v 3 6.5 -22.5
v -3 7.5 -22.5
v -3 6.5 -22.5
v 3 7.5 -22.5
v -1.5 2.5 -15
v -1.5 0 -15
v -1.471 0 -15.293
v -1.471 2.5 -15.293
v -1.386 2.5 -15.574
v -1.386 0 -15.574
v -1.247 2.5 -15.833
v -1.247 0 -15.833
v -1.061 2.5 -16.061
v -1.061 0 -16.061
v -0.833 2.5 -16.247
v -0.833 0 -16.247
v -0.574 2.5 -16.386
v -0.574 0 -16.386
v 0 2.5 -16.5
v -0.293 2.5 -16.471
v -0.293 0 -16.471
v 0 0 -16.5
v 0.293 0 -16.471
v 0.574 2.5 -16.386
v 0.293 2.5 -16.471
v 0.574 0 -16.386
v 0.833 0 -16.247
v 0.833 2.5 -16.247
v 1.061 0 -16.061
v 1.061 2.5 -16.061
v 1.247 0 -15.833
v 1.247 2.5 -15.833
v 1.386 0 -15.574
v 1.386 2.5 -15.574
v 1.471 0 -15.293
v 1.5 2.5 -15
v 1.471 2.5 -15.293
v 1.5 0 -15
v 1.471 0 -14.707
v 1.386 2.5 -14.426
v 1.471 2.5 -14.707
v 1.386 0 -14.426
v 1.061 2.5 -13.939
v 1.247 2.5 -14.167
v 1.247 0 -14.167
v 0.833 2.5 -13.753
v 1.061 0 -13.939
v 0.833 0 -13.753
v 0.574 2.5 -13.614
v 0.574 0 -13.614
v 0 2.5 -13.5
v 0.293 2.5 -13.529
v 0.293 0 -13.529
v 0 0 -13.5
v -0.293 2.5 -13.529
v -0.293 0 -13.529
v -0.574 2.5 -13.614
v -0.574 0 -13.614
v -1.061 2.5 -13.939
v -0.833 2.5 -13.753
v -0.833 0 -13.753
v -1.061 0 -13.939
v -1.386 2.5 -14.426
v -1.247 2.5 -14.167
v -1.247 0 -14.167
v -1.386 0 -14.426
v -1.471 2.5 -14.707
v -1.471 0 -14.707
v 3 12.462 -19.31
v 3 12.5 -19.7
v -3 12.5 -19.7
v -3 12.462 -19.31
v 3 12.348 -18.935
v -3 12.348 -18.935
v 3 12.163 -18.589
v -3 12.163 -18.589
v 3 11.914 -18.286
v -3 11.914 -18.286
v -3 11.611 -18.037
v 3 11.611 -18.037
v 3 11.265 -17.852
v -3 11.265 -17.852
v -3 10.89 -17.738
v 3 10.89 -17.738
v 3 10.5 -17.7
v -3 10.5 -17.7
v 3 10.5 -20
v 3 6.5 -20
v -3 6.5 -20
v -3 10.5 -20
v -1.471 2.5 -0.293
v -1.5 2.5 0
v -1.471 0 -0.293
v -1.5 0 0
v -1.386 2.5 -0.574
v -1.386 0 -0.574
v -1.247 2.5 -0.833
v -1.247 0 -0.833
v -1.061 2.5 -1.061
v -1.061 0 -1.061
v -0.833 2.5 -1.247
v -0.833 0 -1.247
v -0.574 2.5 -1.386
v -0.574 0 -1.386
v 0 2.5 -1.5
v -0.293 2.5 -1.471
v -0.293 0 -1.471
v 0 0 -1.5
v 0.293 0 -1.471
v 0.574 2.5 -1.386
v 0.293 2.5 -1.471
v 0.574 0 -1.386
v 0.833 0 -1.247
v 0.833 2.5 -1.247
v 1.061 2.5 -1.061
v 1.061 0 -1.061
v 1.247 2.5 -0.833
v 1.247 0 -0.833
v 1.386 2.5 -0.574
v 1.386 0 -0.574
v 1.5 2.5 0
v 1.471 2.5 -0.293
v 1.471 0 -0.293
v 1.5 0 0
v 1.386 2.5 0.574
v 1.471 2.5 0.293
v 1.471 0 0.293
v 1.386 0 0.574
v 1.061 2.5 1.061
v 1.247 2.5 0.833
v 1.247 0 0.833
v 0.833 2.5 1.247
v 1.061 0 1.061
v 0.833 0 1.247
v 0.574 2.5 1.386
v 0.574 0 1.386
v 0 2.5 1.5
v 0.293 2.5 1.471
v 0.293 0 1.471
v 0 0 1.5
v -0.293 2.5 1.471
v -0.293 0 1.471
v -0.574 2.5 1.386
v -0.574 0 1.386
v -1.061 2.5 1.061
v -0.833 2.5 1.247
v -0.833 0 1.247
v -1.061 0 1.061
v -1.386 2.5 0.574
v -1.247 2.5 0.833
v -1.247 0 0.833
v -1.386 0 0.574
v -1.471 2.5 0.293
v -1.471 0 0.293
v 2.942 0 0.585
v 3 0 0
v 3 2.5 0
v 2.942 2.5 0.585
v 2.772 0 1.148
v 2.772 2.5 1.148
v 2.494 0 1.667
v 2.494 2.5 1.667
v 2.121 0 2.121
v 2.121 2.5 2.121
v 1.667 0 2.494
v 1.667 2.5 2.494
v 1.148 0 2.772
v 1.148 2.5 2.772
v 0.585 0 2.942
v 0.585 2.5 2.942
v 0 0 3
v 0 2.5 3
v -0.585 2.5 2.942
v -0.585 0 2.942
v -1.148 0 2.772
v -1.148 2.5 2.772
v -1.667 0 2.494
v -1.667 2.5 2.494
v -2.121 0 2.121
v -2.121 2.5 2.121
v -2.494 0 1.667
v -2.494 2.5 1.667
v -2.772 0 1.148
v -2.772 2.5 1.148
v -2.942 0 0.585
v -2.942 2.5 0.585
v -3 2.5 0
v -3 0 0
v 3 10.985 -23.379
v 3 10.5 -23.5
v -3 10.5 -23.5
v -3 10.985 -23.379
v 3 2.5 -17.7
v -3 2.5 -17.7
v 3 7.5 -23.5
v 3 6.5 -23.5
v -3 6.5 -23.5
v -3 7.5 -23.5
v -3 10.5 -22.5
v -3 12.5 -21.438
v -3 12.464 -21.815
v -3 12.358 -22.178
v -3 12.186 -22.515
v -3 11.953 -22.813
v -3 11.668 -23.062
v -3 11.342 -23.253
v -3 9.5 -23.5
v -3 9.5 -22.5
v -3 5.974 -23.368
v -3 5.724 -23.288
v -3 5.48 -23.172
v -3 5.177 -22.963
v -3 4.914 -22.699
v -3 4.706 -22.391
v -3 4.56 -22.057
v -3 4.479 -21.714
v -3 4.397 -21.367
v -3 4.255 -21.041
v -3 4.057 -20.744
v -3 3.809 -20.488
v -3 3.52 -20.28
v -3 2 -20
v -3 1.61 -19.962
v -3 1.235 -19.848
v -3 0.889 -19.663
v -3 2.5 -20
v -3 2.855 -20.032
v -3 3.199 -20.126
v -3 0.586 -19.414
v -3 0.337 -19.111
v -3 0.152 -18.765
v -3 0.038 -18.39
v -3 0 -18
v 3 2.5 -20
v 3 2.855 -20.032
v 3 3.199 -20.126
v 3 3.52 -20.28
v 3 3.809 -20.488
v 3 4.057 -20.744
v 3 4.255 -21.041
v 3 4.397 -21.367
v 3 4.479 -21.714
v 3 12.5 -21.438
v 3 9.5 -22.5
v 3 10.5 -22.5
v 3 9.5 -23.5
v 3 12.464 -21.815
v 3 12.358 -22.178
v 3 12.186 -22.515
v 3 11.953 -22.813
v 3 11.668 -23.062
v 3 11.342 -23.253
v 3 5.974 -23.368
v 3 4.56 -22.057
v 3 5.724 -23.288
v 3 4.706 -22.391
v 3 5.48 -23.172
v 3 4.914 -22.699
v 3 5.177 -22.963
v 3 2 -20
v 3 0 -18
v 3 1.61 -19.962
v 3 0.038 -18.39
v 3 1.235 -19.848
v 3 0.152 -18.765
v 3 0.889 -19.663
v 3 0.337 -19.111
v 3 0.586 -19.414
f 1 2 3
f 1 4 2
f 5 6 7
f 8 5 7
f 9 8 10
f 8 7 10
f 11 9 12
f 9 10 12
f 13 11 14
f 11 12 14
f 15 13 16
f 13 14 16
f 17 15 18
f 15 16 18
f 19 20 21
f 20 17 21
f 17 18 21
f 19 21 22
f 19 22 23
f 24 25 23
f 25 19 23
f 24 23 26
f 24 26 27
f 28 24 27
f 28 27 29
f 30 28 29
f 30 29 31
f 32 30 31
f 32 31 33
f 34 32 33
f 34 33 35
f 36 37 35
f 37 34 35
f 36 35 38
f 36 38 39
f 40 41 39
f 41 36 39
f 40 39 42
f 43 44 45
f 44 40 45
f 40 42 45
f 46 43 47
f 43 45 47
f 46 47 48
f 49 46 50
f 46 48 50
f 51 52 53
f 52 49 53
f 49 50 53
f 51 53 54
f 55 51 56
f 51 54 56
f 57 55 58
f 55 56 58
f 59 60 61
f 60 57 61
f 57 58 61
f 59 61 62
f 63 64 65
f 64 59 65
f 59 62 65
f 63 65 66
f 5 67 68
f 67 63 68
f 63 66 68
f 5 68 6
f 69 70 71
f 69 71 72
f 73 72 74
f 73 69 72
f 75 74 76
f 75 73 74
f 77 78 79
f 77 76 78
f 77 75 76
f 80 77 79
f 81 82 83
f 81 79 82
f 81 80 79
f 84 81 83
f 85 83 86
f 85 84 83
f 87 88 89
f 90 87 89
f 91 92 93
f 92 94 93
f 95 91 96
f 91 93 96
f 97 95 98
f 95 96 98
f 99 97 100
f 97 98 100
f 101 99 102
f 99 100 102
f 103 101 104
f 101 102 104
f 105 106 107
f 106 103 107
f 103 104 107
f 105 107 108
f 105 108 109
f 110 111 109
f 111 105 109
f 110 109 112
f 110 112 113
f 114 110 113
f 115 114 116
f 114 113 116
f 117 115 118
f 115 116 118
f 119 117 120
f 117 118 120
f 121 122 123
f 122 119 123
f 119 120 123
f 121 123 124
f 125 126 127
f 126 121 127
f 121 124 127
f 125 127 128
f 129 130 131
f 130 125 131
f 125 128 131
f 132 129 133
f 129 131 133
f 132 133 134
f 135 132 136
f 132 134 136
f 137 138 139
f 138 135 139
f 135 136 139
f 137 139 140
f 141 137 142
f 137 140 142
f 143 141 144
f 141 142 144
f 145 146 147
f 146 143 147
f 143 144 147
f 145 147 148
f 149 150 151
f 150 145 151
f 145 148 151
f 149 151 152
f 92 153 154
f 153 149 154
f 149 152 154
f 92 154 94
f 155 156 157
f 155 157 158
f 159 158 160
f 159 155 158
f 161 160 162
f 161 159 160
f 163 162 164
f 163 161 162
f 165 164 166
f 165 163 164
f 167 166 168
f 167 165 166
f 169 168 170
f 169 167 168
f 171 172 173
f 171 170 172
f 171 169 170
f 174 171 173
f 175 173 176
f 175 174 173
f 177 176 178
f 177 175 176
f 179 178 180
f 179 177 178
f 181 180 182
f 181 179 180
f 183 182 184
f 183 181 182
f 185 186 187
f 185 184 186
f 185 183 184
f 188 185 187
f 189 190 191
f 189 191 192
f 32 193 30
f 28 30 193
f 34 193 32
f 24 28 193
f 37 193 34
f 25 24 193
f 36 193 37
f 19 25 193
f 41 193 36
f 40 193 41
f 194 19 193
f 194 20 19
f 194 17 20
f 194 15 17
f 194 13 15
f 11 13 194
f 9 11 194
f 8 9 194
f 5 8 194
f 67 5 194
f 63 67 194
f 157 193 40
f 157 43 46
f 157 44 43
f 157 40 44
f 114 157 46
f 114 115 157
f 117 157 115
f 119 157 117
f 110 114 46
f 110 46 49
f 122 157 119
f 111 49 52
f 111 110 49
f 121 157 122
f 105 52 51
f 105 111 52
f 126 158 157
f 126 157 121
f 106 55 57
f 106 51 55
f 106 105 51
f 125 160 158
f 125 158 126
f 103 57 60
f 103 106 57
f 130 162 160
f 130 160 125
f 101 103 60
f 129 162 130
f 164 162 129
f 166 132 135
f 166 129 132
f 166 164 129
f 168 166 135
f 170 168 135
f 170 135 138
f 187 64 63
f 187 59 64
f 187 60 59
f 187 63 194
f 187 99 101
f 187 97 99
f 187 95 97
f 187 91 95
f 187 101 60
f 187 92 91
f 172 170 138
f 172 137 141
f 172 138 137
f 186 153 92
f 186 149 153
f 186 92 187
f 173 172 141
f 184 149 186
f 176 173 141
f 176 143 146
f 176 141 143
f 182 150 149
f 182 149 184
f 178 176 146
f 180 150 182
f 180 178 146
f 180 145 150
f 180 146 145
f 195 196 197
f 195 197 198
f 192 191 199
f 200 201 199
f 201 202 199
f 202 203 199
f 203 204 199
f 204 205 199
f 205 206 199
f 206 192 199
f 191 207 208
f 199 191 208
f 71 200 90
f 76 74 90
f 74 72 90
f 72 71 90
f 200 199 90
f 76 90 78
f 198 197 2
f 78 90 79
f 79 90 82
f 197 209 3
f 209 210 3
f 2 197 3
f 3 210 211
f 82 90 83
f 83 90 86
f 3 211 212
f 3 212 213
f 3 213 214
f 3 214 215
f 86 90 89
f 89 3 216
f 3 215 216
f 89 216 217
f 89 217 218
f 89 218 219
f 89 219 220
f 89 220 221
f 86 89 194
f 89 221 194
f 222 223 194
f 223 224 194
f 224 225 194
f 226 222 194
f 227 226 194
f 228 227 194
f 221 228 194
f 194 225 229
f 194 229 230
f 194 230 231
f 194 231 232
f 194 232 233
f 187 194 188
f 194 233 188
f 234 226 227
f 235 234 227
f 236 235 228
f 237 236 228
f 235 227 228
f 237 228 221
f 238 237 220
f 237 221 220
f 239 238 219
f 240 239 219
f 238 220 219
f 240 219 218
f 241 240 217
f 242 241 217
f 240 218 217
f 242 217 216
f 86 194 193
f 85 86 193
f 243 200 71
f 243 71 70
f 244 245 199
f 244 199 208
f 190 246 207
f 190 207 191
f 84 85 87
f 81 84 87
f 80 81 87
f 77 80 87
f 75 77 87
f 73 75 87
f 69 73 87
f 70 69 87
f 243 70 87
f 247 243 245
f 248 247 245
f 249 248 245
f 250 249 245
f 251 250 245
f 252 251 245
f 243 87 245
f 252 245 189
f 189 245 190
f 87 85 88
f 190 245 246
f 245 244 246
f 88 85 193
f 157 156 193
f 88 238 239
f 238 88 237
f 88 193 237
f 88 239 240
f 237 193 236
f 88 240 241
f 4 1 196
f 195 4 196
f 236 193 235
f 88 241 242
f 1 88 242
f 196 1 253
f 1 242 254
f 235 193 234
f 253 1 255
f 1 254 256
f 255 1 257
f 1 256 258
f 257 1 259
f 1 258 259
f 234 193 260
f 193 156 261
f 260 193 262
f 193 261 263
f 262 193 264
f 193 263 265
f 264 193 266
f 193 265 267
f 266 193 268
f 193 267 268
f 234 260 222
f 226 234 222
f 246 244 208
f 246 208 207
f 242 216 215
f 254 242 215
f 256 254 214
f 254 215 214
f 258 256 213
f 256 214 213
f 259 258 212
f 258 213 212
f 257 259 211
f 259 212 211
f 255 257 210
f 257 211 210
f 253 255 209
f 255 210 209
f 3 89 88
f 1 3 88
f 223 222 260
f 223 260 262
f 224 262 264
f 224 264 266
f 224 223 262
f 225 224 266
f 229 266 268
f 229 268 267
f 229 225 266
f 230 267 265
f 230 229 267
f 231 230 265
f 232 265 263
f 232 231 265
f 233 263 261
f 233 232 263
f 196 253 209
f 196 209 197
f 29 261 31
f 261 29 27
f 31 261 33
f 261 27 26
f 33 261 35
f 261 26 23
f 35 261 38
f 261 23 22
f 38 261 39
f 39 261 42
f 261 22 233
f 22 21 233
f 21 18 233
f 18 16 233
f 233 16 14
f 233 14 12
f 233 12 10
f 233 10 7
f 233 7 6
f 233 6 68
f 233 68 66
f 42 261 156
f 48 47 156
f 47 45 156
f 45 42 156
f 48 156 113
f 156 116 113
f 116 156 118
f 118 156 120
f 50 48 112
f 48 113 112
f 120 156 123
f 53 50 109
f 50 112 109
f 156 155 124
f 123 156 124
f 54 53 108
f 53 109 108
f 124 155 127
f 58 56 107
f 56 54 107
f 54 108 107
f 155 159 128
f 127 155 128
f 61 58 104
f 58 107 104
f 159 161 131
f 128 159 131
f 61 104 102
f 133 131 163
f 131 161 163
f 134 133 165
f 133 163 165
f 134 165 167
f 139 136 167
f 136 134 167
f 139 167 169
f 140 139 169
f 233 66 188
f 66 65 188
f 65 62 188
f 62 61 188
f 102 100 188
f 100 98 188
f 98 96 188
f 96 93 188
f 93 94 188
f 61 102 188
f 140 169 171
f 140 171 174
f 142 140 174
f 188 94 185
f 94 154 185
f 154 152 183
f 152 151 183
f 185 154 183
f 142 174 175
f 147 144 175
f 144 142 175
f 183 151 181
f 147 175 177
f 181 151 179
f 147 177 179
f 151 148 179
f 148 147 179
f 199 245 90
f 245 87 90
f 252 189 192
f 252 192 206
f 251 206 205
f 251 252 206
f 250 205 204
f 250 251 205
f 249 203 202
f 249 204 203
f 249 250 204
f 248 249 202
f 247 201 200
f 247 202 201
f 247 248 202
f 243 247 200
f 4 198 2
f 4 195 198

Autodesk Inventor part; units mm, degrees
ref_plane "YZ Plane" through (0, 0, 0) normal (1, 0, 0) x (0, 1, 0)
ref_plane "XZ Plane" through (0, 0, 0) normal (0, 1, 0) x (-1, 0, 0)
ref_plane "XY Plane" through (0, 0, 0) normal (0, 0, 1) x (1, 0, 0)
sketch "Sketch1" plane through (0, 0, 0) normal (0, 1, 0) x (-1, 0, 0)
  circle A0 centre (0, 0) radius 1.5
  line L0 (0, 0) -> (0, -15)
  line L1 (0, 0) -> (15, 0) construction
  circle A1 centre (0, -15) radius 1.5
  line L2 (0, -15) -> (0, -17.5)
  line L3 (0, -17.5) -> (0, -20)
  circle A2 centre (0, 0) radius 3
  line L4 (3, 0) -> (-3, 0)
  line L5 (-3, 0) -> (-3, -20)
  line L6 (-3, -20) -> (3, -20)
  line L7 (3, -20) -> (3, 0)
  dimension "d6" = 6
  dimension "d0" = 3
  dimension "d1" = 15
  dimension "d2" = 90
  dimension "d3" = 3
  dimension "d4" = 2.5
  dimension "d5" = 2.5
sketch "Sketch1 outline for Extrusion1" plane through (0, 0, 0) normal (0, 1, 0) x (-1, 0, 0)
  arc A0 (3, 0) -> (-3, 0) centre (0, 0) ccw
  line L0 (3, -20) -> (3, 0)
  line L1 (-3, 0) -> (-3, -20)
  line L2 (-3, -20) -> (3, -20)
  circle A1 centre (0, -15) radius 1.5
  circle A2 centre (0, 0) radius 1.5
extrude "Extrusion1" add sketch "Sketch1 outline for Extrusion1" along normal blind 2.5
sketch "Sketch2" plane through (0, 2.5, 0) normal (0, 1, 0) x (1, 0, 0)
  line L0 (3, 20) -> (-3, 20) projected
  line L1 (-3, 20) -> (3, 20)
  line L2 (3, 20) -> (3, 17.7)
  line L3 (3, 17.7) -> (-3, 17.7)
  line L4 (-3, 17.7) -> (-3, 20)
  point P0 (0, 0)
  dimension "d9" = 2.3
sketch "Sketch2 outline for Extrusion2" plane through (0, 2.5, 0) normal (0, 1, 0) x (1, 0, 0)
  line L0 (-3, 20) -> (-3, 17.7)
  line L1 (3, 20) -> (-3, 20)
  line L2 (3, 17.7) -> (3, 20)
  line L3 (-3, 17.7) -> (3, 17.7)
extrude "Extrusion2" add sketch "Sketch2 outline for Extrusion2" along normal blind 10
sketch "Sketch3" plane through (3, 0, -20) normal (0, 0, -1) x (-1, 0, 0)
  line L0 (0, 0) -> (0, 12.5) projected
  line L1 (6, 0) -> (6, 12.5) projected
  line L2 (0, 12.5) -> (6, 12.5)
  line L3 (6, 12.5) -> (6, 10.5)
  line L4 (6, 10.5) -> (0, 10.5)
  line L5 (0, 10.5) -> (0, 12.5)
  line L6 (0, 10.5) -> (6, 10.5)
  line L7 (6, 10.5) -> (6, 6.5)
  line L8 (6, 6.5) -> (0, 6.5)
  line L9 (0, 6.5) -> (0, 10.5)
  line L10 (0, 6.5) -> (6, 6.5)
  line L11 (6, 6.5) -> (6, 4.5)
  line L12 (6, 4.5) -> (0, 4.5)
  line L13 (0, 4.5) -> (0, 6.5)
  point P0 (3, 0)
  point P1 (0, 4.5)
  point P2 (0, 6.5)
  point P3 (0, 10.5)
  dimension "d12" = 2
  dimension "d13" = 6
  dimension "d14" = 4
  dimension "d15" = 2
sketch "Sketch3 outline for Extrusion3" plane through (3, 0, -20) normal (0, 0, -1) x (-1, 0, 0)
  line L0 (0, 4.5) -> (6, 4.5)
  line L1 (0, 6.5) -> (0, 4.5)
  line L2 (6, 6.5) -> (0, 6.5)
  line L3 (6, 4.5) -> (6, 6.5)
  line L4 (6, 12.5) -> (0, 12.5)
  line L5 (6, 10.5) -> (6, 12.5)
  line L6 (0, 10.5) -> (6, 10.5)
  line L7 (0, 12.5) -> (0, 10.5)
extrude "Extrusion3" add sketch "Sketch3 outline for Extrusion3" along normal blind 3
sketch "Sketch4" plane through (3, 0, 0) normal (1, 0, 0) x (0, 0, -1)
  line L0 (20, 10.5) -> (23, 10.5)
  line L1 (20, 6.5) -> (23, 6.5)
  line L2 (23, 10.5) -> (22.5, 10.5)
  line L3 (22.5, 10.5) -> (22.5, 6.5)
  line L4 (22.5, 6.5) -> (23, 6.5)
  line L5 (23, 6.5) -> (23, 10.5)
  line L6 (22.5, 10.5) -> (23.5, 10.5)
  line L7 (23.5, 10.5) -> (23.5, 9.5)
  line L8 (23.5, 9.5) -> (22.5, 9.5)
  line L9 (22.5, 9.5) -> (22.5, 10.5)
  line L10 (22.5, 6.5) -> (23.5, 6.5)
  line L11 (23.5, 6.5) -> (23.5, 7.5)
  line L12 (23.5, 7.5) -> (22.5, 7.5)
  line L13 (22.5, 7.5) -> (22.5, 6.5)
  line L14 (23, 12.5) -> (23, 10.5)
  line L15 (23.5, 10.5) -> (23, 12.5)
  line L16 (23, 12.5) -> (23, 10.5)
  line L17 (23.5, 6.5) -> (23, 4.499196)
  line L18 (23, 4.5) -> (23, 6.5)
  line L19 (23, 4.499196) -> (23, 6.5)
  point P0 (0, 0)
  dimension "d18" = 0.5
  dimension "d19" = 1
  dimension "d20" = 1
  dimension "d21" = 1
  dimension "d22" = 1
sketch "Sketch4 outline for Extrusion4" plane through (3, 0, 0) normal (1, 0, 0) x (0, 0, -1)
  line L0 (23, 4.5) -> (23.5, 6.5)
  line L1 (23, 6.5) -> (23, 4.5)
  line L2 (22.5, 6.5) -> (23, 6.5)
  line L3 (22.5, 7.5) -> (22.5, 6.5)
  line L4 (23.5, 7.5) -> (22.5, 7.5)
  line L5 (23.5, 6.5) -> (23.5, 7.5)
  line L6 (22.5, 9.5) -> (23.5, 9.5)
  line L7 (22.5, 10.5) -> (22.5, 9.5)
  line L8 (23, 10.5) -> (22.5, 10.5)
  line L9 (23, 12.5) -> (23, 10.5)
  line L10 (23.5, 10.5) -> (23, 12.5)
  line L11 (23.5, 9.5) -> (23.5, 10.5)
extrude "Extrusion4" add sketch "Sketch4 outline for Extrusion4" against normal blind 6
fillet "Fillet1" radius 2 5 edges at (0, 12.5, -23) (0, 12.5, -17.7) (0, 4.5, -23) (0, 4.5, -20) (0, 0, -20)
properties part number "wire_holder_femur"
